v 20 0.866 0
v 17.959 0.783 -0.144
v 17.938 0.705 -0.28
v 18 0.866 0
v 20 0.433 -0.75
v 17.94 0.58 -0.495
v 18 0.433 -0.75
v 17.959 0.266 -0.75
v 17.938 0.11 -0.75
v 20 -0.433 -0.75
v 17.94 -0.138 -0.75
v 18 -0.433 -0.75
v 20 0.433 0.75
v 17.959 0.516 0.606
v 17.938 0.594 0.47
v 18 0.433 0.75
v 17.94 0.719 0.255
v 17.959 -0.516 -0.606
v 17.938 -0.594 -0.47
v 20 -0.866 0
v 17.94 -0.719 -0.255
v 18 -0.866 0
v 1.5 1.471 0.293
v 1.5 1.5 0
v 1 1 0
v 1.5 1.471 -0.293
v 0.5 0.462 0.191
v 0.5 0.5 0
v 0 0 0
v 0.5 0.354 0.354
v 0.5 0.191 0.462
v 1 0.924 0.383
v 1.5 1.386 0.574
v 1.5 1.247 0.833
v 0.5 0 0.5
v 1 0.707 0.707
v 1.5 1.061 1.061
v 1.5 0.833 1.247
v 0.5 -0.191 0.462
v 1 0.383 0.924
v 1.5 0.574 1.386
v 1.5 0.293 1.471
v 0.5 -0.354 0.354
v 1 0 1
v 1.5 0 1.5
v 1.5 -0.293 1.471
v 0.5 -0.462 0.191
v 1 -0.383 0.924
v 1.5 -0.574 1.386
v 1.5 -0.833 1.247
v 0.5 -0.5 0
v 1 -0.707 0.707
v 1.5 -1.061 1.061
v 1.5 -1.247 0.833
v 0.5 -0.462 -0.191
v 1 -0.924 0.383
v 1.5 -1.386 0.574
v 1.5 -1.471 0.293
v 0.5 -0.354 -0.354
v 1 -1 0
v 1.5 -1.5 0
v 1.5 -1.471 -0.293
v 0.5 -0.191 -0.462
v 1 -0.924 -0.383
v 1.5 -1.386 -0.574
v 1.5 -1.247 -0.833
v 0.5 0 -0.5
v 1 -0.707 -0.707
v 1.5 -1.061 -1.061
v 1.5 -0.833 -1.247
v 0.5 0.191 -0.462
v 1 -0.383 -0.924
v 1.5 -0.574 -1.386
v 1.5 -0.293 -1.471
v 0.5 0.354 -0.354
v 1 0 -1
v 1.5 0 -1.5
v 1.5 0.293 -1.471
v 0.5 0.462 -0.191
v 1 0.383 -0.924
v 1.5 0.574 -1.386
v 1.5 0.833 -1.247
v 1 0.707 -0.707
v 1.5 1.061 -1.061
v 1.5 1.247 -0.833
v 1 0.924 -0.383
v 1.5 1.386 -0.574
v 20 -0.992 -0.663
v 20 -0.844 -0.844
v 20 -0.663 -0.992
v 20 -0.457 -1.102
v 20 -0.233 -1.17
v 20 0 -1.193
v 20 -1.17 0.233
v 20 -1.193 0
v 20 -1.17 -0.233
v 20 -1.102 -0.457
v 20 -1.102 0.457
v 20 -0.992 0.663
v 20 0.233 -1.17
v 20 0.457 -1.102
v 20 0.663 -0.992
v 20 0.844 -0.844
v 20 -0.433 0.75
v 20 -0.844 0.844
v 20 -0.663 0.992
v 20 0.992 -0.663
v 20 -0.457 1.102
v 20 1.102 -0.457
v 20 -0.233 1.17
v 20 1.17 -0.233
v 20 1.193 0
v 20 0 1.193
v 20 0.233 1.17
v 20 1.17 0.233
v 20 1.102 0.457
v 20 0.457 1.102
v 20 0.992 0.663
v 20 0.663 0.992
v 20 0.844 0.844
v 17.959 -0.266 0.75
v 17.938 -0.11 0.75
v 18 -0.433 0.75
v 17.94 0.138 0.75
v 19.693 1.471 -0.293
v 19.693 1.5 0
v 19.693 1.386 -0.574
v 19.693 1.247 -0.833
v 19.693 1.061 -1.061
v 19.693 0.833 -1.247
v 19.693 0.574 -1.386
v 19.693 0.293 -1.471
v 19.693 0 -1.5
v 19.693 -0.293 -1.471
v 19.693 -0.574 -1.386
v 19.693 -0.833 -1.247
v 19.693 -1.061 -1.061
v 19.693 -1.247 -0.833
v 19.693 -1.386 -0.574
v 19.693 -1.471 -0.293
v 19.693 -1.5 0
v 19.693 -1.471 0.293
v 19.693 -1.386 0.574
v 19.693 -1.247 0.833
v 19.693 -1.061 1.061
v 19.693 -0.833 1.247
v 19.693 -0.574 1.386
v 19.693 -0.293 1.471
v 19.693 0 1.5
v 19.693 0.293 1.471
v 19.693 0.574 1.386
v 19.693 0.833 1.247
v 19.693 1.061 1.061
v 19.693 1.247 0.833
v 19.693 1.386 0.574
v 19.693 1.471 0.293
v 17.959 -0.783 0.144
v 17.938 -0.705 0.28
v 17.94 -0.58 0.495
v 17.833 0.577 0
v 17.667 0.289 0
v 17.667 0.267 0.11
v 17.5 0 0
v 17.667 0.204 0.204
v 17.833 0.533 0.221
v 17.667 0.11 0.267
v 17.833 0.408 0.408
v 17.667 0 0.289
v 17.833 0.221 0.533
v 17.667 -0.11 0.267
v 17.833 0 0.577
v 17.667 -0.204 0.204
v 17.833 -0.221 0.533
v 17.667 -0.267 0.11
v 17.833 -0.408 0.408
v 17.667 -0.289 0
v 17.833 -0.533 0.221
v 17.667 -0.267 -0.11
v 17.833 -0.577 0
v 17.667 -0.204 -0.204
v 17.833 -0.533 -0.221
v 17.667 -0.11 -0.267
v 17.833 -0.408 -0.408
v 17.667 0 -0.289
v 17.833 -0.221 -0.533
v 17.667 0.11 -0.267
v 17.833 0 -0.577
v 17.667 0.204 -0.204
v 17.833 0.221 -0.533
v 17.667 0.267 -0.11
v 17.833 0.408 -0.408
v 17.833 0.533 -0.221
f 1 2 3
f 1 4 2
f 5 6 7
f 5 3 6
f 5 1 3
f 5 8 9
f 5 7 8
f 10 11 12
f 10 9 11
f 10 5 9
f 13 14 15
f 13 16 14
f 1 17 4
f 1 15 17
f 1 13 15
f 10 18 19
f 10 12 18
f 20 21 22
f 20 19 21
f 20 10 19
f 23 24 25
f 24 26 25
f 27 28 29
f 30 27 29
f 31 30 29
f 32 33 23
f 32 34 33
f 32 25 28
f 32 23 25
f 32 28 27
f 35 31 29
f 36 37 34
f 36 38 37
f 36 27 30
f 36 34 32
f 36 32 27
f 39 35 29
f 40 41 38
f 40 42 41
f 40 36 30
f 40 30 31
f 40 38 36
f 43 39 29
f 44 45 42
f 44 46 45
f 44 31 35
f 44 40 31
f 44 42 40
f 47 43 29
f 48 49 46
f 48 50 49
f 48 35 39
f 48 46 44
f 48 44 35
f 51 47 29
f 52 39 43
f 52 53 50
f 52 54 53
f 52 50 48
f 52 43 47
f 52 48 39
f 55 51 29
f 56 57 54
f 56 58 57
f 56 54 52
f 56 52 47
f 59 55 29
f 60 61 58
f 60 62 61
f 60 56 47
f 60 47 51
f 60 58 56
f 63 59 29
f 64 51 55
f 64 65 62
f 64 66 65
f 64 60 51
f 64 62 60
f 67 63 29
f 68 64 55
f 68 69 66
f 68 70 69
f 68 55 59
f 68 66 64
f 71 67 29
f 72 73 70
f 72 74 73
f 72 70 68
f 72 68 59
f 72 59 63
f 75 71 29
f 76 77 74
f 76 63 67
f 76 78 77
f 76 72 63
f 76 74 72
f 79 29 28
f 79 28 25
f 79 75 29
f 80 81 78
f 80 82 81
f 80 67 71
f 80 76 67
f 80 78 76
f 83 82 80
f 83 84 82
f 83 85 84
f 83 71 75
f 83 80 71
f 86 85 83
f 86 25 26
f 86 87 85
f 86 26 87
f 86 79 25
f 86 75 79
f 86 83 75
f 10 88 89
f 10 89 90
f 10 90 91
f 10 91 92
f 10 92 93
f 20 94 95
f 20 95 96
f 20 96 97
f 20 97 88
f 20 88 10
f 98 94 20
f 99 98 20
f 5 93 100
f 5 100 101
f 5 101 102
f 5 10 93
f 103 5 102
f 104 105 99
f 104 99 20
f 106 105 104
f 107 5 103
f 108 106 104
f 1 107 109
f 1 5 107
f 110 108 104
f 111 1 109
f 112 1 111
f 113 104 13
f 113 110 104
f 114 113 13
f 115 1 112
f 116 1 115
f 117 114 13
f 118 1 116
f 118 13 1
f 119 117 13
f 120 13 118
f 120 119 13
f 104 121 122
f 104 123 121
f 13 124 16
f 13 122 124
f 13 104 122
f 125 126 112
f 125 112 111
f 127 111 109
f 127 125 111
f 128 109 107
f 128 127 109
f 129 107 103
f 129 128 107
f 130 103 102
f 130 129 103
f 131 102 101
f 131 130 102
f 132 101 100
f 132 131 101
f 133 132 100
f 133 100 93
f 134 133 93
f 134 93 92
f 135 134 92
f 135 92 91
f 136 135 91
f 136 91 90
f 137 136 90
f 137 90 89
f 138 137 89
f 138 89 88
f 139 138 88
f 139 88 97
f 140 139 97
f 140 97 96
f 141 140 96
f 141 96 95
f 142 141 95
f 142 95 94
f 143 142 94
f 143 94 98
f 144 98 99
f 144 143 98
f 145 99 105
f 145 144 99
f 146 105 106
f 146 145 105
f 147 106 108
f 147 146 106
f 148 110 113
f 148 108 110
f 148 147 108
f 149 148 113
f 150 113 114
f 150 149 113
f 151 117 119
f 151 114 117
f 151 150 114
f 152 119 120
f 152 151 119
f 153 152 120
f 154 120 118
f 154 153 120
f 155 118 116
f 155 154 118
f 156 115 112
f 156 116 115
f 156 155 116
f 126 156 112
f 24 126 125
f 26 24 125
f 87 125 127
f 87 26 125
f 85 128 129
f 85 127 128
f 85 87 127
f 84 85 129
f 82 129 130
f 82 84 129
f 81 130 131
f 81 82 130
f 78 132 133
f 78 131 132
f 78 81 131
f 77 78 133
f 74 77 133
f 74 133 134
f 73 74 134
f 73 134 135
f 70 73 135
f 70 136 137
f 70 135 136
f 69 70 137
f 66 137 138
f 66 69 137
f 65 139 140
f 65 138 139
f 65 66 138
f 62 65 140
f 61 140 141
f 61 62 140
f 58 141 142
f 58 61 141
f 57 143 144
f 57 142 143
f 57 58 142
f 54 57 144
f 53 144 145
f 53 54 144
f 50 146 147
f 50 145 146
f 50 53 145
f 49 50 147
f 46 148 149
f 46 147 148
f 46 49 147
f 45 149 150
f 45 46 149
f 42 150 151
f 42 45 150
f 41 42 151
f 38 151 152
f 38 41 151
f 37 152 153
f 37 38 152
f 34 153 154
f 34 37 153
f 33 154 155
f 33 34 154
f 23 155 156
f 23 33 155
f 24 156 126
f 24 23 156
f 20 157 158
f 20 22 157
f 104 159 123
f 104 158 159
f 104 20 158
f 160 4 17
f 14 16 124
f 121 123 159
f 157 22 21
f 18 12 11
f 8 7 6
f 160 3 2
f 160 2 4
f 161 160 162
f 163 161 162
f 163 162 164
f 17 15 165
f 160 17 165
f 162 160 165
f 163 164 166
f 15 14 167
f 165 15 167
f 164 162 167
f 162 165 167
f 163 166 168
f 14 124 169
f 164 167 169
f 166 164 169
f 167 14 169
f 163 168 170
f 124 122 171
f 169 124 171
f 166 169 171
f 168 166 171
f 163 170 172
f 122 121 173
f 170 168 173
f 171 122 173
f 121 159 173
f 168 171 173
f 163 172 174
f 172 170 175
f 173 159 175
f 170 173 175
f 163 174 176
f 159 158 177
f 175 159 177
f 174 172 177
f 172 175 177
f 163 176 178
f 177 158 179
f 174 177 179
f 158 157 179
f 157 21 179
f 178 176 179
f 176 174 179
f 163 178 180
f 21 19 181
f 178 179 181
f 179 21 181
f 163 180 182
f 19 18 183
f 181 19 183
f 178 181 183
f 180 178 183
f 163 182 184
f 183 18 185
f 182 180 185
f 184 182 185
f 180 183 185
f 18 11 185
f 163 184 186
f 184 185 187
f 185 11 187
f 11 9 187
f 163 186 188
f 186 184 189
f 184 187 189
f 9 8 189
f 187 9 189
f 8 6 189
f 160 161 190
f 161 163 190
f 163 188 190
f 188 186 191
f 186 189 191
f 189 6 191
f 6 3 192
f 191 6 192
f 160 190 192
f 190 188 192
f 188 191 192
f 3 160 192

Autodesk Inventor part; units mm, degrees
ref_plane "YZ Plane" through (0, 0, 0) normal (1, 0, 0) x (0, 1, 0)
ref_plane "XZ Plane" through (0, 0, 0) normal (0, 1, 0) x (-1, 0, 0)
sketch "Skizze1" plane through (0, 0, 0) normal (0, 0, 1) x (1, 0, 0)
  line L0 (0, 0) -> (17.5, 0)
  line L1 (20, 0.866) -> (20, 1.5)
  line L2 (20, 1.5) -> (0, 1.5)
  line L3 (20, 0.866) -> (18, 0.866)
  line L4 (18, 0.866) -> (17.5, 0)
  line L5 (0, -0.3) -> (0, 1.8) projected
  line L6 (0, 1.5) -> (0, 0)
  dimension "d0" = 2
  dimension "d1" = 60
  dimension "d2" = 3
  dimension "d3" = 1.7321
  dimension "d5" = 20
revolve "Körper" add sketch "Skizze1" angle 360 about axis through (0, 0, 0) along (1, 0, 0)
sketch "Skizze2" plane through (20, 0, 0) normal (1, 0, 0) x (0, 1, 0)
  circle A0 centre (0, 0) radius 0.866 projected
  line L0 (-0.433, 0.75) -> (0.433, 0.75)
  line L1 (0.433, 0.75) -> (0.866, 0)
  line L2 (0.866, 0) -> (0.433, -0.75)
  line L3 (0.433, -0.75) -> (-0.433, -0.75)
  line L4 (-0.433, -0.75) -> (-0.866, 0)
  line L5 (-0.866, 0) -> (-0.433, 0.75)
  point P0 (0, 0)
  point P1 (0, 0)
extrude "Loch" add sketch "Skizze2" against normal up to next contours L1 A0 | A0 L2 | L0 A0 | A0 L3 | L5 A0 | A0 L4
thread "Gewinde" size "M3x0.5" class "6g" standard "ISO Metric profile" length 20
chamfer "Fase1" distance 1.5 angle 45 1 edges at (0, -1.5, 0) measured on face at (13.3333, 1.4951, -0.1207)
chamfer "Fase2" distance 0.3067 angle 45 1 edges at (20, -1.5, 0) measured on face at (13.8332, 1.4806, -0.2406)
ref_plane "Work Plane1" through (10, 0, 0) normal (0, 0, 1) x (1, 0, 0)
equation "\"d0\" = INTI"
equation "\"d2\" = NND"
equation "\"d3\" = 1.1547 * SW"
equation "\"d5\" = NLG"
equation "\"d12\" = NLG"
equation "\"d9\" = FAWI"
equation "\"d10\" = -0.5 * GD1 + 0.5 * NND"
equation "\"d11\" = FAWI"
equation "\"d35\" = -0.5 * GD1 + 0.5 * NND"
equation "\"NND\" = 3"
equation "\"NLG\" = 20"
equation "\"INTI\" = 2"
equation "\"FAWI\" = 45deg"
equation "\"SW\" = 1.5"
equation "\"GD1\" = THREADDIA - 1.2269 * PTC"
equation "\"FAWI1\" = 45deg"
equation "\"SPD\" = 0.00001"
equation "\"GUL\" = 0.61345 * PTC"
equation "\"TOA\" = 30deg"
equation "\"THREADDIA\" = 3"
equation "\"PTC\" = 0.5"
equation "\"GAL\" = 0.61345 * PTC"
equation "\"E0\" = 1.155 * SW"
properties part number "DIN 914 - M3 x 20" material "Stahl, weich"
